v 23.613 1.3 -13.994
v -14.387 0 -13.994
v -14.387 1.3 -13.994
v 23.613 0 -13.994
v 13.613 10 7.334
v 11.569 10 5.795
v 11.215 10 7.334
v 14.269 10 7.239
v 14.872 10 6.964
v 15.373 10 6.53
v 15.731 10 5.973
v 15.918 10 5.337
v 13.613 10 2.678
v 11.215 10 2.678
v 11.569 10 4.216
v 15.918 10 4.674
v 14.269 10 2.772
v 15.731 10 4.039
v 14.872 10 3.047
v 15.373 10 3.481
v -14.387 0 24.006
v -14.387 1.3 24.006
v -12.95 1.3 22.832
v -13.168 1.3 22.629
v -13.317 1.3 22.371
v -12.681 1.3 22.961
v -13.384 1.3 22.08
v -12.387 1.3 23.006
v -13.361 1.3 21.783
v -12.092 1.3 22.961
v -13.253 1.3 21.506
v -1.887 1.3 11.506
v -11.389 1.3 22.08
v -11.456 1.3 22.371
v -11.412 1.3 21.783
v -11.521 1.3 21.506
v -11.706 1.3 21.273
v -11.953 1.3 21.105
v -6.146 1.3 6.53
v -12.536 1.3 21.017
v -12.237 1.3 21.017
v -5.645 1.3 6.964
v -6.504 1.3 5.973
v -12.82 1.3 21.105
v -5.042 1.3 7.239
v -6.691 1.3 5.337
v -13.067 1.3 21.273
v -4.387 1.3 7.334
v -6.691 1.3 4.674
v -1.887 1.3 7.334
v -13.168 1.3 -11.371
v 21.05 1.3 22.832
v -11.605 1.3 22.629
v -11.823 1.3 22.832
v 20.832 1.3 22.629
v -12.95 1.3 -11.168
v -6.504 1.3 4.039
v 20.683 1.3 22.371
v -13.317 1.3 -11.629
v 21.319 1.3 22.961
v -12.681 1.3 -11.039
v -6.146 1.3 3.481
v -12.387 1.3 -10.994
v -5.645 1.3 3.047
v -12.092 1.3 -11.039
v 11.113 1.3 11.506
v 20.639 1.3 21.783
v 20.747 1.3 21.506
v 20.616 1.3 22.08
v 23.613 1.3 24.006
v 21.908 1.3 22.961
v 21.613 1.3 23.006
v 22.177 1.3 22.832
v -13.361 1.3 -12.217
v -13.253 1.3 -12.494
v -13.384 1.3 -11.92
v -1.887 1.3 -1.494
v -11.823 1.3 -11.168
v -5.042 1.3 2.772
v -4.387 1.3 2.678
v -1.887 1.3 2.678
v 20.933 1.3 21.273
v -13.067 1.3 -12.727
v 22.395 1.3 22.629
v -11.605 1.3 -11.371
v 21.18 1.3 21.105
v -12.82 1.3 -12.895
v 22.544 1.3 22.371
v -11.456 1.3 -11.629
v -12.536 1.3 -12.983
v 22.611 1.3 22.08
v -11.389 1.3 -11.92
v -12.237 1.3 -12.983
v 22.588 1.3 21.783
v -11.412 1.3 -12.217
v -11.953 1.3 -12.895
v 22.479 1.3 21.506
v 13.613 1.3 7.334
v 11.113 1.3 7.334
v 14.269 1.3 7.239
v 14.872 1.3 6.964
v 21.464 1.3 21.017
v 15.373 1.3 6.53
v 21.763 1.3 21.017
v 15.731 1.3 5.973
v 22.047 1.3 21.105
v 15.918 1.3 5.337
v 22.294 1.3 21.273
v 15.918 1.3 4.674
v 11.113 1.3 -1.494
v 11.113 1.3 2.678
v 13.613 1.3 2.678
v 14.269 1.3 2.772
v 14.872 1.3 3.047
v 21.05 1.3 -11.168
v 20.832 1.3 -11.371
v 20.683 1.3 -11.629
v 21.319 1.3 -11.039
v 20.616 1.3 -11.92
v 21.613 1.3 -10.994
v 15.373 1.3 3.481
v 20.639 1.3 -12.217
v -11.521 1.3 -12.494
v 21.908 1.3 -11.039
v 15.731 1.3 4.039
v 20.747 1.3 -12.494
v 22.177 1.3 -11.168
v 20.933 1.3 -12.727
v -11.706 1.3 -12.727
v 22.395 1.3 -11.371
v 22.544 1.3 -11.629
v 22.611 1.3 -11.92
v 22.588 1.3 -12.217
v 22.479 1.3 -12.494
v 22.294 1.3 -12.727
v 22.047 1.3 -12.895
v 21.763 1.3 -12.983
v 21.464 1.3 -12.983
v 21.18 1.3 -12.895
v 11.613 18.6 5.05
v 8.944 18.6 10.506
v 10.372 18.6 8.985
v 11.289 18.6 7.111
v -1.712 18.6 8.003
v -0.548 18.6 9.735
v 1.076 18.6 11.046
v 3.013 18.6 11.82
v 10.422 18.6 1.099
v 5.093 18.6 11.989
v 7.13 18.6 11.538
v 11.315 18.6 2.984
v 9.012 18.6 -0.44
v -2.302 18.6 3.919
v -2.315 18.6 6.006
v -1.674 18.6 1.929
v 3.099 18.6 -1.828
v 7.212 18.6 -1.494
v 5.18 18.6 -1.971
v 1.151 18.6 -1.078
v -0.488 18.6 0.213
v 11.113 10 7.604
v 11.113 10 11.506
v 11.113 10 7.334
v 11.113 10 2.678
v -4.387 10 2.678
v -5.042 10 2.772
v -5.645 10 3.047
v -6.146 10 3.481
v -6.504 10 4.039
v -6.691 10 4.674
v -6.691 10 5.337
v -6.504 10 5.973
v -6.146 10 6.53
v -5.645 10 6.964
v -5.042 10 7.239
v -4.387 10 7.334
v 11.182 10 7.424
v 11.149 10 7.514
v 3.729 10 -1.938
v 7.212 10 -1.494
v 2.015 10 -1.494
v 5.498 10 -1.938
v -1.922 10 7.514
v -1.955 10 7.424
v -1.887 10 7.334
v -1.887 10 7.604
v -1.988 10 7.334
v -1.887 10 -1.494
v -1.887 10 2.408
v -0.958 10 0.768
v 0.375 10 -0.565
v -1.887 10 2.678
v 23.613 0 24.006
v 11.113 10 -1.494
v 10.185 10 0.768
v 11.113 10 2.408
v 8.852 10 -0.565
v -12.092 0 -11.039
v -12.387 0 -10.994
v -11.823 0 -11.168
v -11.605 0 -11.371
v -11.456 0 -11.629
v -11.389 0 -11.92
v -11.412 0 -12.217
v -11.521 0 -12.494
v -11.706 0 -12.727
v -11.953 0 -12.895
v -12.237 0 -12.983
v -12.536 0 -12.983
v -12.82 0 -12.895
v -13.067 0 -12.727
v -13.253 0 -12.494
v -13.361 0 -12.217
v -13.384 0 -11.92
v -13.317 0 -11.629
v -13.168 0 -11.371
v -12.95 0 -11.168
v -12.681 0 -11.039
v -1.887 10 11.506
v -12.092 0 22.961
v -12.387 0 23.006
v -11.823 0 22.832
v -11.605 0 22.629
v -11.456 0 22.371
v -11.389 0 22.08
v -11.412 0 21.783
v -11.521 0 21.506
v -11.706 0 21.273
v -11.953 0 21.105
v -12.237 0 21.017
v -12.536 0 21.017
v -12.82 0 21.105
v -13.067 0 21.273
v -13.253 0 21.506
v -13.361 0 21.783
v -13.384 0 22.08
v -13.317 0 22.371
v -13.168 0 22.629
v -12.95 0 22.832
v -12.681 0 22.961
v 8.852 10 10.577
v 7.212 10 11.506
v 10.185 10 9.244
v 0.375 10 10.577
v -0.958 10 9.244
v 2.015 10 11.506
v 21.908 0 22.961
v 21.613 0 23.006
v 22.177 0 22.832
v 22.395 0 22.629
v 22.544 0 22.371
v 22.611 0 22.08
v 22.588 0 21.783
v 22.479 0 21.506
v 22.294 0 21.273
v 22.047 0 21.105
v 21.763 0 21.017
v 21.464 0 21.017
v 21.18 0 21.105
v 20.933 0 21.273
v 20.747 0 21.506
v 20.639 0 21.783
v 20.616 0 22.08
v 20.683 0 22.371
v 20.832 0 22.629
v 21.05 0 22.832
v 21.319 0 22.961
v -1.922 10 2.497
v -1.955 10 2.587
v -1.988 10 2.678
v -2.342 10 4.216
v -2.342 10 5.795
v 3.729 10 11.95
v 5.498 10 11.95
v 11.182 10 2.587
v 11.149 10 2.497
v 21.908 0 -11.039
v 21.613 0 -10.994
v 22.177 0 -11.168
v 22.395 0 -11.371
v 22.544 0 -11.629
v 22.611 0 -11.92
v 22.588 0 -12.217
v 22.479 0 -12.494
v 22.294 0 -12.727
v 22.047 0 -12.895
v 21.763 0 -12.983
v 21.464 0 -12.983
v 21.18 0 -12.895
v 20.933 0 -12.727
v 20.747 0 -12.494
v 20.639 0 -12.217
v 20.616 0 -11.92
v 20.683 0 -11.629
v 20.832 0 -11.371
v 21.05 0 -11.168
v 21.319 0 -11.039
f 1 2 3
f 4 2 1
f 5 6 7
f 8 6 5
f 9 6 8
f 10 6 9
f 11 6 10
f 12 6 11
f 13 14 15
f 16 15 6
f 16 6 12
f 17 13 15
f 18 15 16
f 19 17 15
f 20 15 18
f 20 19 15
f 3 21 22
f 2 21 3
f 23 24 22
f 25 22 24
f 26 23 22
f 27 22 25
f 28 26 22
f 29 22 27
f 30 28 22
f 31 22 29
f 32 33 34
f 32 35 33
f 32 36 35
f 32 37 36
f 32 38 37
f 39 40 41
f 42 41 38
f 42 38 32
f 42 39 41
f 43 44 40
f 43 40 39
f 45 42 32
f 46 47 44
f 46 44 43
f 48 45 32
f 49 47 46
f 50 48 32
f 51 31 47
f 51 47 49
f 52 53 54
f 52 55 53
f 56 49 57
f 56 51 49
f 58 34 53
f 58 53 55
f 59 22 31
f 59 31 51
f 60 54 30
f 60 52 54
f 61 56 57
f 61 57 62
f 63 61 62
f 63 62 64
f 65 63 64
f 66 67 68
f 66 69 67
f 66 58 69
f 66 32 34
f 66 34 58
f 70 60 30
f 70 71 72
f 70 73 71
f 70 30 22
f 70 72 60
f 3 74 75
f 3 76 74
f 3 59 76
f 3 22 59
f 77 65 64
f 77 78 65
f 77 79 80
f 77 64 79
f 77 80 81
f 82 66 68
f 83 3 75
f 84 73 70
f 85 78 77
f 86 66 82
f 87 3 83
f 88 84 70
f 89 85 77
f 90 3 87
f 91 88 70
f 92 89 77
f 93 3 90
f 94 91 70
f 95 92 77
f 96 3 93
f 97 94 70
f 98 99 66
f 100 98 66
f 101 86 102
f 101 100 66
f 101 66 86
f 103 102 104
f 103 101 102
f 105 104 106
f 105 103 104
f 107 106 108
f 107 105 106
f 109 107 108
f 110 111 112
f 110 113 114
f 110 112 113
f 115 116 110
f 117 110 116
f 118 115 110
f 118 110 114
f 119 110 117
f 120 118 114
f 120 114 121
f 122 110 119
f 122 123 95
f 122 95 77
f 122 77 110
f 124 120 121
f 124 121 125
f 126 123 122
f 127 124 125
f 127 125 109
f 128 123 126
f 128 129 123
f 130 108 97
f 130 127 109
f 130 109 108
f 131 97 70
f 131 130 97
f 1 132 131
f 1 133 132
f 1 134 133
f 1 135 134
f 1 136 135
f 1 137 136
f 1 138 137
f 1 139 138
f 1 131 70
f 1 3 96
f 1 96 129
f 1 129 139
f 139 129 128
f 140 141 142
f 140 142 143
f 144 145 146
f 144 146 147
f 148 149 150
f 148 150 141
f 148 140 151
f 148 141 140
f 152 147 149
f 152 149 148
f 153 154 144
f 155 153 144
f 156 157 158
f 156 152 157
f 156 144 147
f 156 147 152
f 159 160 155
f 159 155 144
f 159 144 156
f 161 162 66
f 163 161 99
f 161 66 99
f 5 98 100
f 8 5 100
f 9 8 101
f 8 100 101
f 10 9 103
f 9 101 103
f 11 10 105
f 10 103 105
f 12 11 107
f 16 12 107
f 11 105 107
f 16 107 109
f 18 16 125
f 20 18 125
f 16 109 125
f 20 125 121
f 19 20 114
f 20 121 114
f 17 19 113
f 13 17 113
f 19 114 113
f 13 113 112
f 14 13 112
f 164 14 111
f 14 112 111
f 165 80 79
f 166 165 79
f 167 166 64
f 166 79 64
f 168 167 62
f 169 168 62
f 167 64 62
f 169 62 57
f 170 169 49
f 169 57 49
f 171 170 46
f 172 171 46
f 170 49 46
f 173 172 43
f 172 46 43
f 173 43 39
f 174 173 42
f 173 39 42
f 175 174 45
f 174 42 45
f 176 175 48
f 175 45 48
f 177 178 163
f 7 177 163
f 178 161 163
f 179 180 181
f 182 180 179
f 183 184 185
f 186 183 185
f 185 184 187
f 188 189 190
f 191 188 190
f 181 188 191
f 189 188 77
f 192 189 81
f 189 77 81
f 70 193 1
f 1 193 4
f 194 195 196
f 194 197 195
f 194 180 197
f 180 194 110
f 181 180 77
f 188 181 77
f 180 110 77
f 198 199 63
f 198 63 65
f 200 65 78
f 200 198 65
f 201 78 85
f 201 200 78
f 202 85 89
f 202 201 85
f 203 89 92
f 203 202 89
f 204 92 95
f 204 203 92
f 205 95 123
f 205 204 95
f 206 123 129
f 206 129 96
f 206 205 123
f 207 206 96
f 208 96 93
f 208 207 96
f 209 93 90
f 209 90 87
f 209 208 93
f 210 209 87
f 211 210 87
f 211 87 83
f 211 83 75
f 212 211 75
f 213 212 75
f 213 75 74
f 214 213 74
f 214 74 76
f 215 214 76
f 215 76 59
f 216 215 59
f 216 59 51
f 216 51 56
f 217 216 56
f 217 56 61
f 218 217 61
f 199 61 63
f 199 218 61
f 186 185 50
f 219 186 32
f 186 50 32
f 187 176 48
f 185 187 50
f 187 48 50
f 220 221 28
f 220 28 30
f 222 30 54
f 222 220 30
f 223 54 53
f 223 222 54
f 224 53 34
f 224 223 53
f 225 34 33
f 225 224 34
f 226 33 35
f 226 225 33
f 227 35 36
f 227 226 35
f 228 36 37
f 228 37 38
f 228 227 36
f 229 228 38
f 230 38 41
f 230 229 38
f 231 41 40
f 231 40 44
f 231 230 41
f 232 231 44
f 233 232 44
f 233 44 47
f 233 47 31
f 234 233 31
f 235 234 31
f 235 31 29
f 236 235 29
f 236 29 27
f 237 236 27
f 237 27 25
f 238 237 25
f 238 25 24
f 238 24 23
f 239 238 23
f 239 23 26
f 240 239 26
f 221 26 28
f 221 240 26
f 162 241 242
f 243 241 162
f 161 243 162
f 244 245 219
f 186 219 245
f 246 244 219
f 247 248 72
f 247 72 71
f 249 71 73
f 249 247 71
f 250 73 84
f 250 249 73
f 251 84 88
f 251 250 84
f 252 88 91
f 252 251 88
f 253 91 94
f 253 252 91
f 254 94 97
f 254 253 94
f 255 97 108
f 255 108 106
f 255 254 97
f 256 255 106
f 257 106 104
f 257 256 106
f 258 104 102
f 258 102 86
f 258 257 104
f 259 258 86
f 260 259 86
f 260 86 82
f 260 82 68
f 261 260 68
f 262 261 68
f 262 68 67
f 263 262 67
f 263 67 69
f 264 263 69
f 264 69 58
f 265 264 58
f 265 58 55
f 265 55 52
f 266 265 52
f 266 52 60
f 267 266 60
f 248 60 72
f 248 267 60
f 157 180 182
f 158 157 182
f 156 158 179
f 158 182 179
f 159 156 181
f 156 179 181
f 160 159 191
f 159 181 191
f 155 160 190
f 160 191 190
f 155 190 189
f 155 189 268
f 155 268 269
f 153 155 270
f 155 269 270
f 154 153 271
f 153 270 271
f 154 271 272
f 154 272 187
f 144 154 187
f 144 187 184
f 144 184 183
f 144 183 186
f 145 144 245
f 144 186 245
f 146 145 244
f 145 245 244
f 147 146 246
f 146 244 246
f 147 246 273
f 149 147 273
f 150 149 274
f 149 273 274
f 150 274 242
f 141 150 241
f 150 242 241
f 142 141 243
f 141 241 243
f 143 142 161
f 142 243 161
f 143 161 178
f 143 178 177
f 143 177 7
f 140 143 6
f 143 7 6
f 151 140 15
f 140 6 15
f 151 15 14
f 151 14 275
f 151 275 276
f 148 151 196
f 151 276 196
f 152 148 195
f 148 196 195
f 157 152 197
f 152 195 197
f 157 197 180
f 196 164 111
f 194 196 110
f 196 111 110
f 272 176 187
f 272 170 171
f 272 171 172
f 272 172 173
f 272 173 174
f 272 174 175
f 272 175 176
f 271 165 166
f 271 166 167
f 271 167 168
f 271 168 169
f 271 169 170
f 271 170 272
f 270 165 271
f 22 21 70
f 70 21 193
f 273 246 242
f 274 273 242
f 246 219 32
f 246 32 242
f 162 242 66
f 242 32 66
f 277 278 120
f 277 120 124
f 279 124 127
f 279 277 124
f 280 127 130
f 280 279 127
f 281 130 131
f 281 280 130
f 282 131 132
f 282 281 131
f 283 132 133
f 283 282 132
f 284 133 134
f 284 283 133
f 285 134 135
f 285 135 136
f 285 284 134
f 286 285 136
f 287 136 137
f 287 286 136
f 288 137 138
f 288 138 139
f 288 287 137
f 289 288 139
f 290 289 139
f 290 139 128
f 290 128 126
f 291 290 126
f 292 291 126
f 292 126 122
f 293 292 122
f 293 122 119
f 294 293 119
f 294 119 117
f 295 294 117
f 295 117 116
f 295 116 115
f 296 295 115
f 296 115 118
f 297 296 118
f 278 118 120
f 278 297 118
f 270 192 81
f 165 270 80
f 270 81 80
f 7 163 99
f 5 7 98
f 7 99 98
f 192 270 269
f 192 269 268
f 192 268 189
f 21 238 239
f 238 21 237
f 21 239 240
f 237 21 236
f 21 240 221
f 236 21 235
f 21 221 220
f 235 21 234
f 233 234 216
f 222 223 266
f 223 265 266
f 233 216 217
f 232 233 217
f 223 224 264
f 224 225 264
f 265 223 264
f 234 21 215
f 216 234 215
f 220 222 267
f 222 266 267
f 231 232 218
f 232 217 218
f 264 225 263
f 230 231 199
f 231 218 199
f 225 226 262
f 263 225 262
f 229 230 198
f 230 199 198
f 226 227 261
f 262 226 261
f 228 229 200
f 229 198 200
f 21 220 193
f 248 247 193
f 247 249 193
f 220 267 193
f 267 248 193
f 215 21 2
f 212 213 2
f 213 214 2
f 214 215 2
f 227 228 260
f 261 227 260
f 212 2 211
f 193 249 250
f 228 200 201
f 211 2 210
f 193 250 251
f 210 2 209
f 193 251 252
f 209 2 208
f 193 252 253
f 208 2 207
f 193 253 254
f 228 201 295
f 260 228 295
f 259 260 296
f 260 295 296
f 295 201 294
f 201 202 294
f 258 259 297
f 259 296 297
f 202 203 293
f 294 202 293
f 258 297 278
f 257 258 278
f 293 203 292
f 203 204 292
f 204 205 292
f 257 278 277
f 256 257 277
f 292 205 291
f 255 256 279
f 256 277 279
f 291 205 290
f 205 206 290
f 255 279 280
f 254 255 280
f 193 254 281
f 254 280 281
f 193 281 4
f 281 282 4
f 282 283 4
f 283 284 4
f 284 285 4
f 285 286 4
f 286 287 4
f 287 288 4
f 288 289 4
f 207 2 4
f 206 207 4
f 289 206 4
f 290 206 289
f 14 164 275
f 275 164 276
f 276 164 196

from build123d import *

# Parameters (mm, degrees)
SKETCH1_W           = 38
SKETCH1_H           = 38
SKETCH1_R           = 1
BOSS_EXTRUDE1_DEPTH = 1.3
BOSS_EXTRUDE2_DEPTH = 8.7
SKETCH3_R           = 7
BOSS_EXTRUDE3_DEPTH = 8.6


with BuildPart() as part:
    # Sketch1 → Boss-Extrude1 (new body)
    with BuildSketch(Plane(origin=(0, 0, 0), x_dir=(1, 0, 0), z_dir=(0, 1, 0))):
        with Locations((4.613461538, -5.005769231)):
            Rectangle(SKETCH1_W, SKETCH1_H)
        with Locations((-12.386538462, 11.994230769)):
            Circle(SKETCH1_R, mode=Mode.SUBTRACT)
        with Locations((21.613461538, 11.994230769)):
            Circle(SKETCH1_R, mode=Mode.SUBTRACT)
        with Locations((21.613461538, -22.005769231)):
            Circle(SKETCH1_R, mode=Mode.SUBTRACT)
        with Locations((-12.386538462, -22.005769231)):
            Circle(SKETCH1_R, mode=Mode.SUBTRACT)
    extrude(amount=BOSS_EXTRUDE1_DEPTH)

    # Sketch2 → Boss-Extrude2 (add)
    with BuildSketch(Plane(origin=(0, 1.3, 0), x_dir=(1, 0, 0), z_dir=(0, 1, 0))):
        with BuildLine():
            Line((-1.886538462, -11.505769231), (11.113461538, -11.505769231))
            Line((11.113461538, -11.505769231), (11.113461538, -7.333742244))
            Line((11.113461538, -7.333742244), (13.613461538, -7.333742244))
            ThreePointArc((13.613461538, -7.333742244), (15.941434552, -5.005769231), (13.613461538, -2.677796217))
            Line((13.613461538, -2.677796217), (11.113461538, -2.677796217))
            Line((11.113461538, -2.677796217), (11.113461538, 1.494230769))
            Line((11.113461538, 1.494230769), (-1.886538462, 1.494230769))
            Line((-1.886538462, 1.494230769), (-1.886538462, -2.677796217))
            Line((-1.886538462, -2.677796217), (-4.386538462, -2.677796217))
            ThreePointArc((-4.386538462, -2.677796217), (-6.714511475, -5.005769231), (-4.386538462, -7.333742244))
            Line((-4.386538462, -7.333742244), (-1.886538462, -7.333742244))
            Line((-1.886538462, -7.333742244), (-1.886538462, -11.505769231))
        make_face()
    extrude(amount=BOSS_EXTRUDE2_DEPTH)

    # Sketch3 → Boss-Extrude3 (add)
    with BuildSketch(Plane(origin=(0, 10, 0), x_dir=(1, 0, 0), z_dir=(0, 1, 0))):
        with Locations((4.613461538, -5.005769231)):
            Circle(SKETCH3_R)
    extrude(amount=BOSS_EXTRUDE3_DEPTH)


solid = part.part
